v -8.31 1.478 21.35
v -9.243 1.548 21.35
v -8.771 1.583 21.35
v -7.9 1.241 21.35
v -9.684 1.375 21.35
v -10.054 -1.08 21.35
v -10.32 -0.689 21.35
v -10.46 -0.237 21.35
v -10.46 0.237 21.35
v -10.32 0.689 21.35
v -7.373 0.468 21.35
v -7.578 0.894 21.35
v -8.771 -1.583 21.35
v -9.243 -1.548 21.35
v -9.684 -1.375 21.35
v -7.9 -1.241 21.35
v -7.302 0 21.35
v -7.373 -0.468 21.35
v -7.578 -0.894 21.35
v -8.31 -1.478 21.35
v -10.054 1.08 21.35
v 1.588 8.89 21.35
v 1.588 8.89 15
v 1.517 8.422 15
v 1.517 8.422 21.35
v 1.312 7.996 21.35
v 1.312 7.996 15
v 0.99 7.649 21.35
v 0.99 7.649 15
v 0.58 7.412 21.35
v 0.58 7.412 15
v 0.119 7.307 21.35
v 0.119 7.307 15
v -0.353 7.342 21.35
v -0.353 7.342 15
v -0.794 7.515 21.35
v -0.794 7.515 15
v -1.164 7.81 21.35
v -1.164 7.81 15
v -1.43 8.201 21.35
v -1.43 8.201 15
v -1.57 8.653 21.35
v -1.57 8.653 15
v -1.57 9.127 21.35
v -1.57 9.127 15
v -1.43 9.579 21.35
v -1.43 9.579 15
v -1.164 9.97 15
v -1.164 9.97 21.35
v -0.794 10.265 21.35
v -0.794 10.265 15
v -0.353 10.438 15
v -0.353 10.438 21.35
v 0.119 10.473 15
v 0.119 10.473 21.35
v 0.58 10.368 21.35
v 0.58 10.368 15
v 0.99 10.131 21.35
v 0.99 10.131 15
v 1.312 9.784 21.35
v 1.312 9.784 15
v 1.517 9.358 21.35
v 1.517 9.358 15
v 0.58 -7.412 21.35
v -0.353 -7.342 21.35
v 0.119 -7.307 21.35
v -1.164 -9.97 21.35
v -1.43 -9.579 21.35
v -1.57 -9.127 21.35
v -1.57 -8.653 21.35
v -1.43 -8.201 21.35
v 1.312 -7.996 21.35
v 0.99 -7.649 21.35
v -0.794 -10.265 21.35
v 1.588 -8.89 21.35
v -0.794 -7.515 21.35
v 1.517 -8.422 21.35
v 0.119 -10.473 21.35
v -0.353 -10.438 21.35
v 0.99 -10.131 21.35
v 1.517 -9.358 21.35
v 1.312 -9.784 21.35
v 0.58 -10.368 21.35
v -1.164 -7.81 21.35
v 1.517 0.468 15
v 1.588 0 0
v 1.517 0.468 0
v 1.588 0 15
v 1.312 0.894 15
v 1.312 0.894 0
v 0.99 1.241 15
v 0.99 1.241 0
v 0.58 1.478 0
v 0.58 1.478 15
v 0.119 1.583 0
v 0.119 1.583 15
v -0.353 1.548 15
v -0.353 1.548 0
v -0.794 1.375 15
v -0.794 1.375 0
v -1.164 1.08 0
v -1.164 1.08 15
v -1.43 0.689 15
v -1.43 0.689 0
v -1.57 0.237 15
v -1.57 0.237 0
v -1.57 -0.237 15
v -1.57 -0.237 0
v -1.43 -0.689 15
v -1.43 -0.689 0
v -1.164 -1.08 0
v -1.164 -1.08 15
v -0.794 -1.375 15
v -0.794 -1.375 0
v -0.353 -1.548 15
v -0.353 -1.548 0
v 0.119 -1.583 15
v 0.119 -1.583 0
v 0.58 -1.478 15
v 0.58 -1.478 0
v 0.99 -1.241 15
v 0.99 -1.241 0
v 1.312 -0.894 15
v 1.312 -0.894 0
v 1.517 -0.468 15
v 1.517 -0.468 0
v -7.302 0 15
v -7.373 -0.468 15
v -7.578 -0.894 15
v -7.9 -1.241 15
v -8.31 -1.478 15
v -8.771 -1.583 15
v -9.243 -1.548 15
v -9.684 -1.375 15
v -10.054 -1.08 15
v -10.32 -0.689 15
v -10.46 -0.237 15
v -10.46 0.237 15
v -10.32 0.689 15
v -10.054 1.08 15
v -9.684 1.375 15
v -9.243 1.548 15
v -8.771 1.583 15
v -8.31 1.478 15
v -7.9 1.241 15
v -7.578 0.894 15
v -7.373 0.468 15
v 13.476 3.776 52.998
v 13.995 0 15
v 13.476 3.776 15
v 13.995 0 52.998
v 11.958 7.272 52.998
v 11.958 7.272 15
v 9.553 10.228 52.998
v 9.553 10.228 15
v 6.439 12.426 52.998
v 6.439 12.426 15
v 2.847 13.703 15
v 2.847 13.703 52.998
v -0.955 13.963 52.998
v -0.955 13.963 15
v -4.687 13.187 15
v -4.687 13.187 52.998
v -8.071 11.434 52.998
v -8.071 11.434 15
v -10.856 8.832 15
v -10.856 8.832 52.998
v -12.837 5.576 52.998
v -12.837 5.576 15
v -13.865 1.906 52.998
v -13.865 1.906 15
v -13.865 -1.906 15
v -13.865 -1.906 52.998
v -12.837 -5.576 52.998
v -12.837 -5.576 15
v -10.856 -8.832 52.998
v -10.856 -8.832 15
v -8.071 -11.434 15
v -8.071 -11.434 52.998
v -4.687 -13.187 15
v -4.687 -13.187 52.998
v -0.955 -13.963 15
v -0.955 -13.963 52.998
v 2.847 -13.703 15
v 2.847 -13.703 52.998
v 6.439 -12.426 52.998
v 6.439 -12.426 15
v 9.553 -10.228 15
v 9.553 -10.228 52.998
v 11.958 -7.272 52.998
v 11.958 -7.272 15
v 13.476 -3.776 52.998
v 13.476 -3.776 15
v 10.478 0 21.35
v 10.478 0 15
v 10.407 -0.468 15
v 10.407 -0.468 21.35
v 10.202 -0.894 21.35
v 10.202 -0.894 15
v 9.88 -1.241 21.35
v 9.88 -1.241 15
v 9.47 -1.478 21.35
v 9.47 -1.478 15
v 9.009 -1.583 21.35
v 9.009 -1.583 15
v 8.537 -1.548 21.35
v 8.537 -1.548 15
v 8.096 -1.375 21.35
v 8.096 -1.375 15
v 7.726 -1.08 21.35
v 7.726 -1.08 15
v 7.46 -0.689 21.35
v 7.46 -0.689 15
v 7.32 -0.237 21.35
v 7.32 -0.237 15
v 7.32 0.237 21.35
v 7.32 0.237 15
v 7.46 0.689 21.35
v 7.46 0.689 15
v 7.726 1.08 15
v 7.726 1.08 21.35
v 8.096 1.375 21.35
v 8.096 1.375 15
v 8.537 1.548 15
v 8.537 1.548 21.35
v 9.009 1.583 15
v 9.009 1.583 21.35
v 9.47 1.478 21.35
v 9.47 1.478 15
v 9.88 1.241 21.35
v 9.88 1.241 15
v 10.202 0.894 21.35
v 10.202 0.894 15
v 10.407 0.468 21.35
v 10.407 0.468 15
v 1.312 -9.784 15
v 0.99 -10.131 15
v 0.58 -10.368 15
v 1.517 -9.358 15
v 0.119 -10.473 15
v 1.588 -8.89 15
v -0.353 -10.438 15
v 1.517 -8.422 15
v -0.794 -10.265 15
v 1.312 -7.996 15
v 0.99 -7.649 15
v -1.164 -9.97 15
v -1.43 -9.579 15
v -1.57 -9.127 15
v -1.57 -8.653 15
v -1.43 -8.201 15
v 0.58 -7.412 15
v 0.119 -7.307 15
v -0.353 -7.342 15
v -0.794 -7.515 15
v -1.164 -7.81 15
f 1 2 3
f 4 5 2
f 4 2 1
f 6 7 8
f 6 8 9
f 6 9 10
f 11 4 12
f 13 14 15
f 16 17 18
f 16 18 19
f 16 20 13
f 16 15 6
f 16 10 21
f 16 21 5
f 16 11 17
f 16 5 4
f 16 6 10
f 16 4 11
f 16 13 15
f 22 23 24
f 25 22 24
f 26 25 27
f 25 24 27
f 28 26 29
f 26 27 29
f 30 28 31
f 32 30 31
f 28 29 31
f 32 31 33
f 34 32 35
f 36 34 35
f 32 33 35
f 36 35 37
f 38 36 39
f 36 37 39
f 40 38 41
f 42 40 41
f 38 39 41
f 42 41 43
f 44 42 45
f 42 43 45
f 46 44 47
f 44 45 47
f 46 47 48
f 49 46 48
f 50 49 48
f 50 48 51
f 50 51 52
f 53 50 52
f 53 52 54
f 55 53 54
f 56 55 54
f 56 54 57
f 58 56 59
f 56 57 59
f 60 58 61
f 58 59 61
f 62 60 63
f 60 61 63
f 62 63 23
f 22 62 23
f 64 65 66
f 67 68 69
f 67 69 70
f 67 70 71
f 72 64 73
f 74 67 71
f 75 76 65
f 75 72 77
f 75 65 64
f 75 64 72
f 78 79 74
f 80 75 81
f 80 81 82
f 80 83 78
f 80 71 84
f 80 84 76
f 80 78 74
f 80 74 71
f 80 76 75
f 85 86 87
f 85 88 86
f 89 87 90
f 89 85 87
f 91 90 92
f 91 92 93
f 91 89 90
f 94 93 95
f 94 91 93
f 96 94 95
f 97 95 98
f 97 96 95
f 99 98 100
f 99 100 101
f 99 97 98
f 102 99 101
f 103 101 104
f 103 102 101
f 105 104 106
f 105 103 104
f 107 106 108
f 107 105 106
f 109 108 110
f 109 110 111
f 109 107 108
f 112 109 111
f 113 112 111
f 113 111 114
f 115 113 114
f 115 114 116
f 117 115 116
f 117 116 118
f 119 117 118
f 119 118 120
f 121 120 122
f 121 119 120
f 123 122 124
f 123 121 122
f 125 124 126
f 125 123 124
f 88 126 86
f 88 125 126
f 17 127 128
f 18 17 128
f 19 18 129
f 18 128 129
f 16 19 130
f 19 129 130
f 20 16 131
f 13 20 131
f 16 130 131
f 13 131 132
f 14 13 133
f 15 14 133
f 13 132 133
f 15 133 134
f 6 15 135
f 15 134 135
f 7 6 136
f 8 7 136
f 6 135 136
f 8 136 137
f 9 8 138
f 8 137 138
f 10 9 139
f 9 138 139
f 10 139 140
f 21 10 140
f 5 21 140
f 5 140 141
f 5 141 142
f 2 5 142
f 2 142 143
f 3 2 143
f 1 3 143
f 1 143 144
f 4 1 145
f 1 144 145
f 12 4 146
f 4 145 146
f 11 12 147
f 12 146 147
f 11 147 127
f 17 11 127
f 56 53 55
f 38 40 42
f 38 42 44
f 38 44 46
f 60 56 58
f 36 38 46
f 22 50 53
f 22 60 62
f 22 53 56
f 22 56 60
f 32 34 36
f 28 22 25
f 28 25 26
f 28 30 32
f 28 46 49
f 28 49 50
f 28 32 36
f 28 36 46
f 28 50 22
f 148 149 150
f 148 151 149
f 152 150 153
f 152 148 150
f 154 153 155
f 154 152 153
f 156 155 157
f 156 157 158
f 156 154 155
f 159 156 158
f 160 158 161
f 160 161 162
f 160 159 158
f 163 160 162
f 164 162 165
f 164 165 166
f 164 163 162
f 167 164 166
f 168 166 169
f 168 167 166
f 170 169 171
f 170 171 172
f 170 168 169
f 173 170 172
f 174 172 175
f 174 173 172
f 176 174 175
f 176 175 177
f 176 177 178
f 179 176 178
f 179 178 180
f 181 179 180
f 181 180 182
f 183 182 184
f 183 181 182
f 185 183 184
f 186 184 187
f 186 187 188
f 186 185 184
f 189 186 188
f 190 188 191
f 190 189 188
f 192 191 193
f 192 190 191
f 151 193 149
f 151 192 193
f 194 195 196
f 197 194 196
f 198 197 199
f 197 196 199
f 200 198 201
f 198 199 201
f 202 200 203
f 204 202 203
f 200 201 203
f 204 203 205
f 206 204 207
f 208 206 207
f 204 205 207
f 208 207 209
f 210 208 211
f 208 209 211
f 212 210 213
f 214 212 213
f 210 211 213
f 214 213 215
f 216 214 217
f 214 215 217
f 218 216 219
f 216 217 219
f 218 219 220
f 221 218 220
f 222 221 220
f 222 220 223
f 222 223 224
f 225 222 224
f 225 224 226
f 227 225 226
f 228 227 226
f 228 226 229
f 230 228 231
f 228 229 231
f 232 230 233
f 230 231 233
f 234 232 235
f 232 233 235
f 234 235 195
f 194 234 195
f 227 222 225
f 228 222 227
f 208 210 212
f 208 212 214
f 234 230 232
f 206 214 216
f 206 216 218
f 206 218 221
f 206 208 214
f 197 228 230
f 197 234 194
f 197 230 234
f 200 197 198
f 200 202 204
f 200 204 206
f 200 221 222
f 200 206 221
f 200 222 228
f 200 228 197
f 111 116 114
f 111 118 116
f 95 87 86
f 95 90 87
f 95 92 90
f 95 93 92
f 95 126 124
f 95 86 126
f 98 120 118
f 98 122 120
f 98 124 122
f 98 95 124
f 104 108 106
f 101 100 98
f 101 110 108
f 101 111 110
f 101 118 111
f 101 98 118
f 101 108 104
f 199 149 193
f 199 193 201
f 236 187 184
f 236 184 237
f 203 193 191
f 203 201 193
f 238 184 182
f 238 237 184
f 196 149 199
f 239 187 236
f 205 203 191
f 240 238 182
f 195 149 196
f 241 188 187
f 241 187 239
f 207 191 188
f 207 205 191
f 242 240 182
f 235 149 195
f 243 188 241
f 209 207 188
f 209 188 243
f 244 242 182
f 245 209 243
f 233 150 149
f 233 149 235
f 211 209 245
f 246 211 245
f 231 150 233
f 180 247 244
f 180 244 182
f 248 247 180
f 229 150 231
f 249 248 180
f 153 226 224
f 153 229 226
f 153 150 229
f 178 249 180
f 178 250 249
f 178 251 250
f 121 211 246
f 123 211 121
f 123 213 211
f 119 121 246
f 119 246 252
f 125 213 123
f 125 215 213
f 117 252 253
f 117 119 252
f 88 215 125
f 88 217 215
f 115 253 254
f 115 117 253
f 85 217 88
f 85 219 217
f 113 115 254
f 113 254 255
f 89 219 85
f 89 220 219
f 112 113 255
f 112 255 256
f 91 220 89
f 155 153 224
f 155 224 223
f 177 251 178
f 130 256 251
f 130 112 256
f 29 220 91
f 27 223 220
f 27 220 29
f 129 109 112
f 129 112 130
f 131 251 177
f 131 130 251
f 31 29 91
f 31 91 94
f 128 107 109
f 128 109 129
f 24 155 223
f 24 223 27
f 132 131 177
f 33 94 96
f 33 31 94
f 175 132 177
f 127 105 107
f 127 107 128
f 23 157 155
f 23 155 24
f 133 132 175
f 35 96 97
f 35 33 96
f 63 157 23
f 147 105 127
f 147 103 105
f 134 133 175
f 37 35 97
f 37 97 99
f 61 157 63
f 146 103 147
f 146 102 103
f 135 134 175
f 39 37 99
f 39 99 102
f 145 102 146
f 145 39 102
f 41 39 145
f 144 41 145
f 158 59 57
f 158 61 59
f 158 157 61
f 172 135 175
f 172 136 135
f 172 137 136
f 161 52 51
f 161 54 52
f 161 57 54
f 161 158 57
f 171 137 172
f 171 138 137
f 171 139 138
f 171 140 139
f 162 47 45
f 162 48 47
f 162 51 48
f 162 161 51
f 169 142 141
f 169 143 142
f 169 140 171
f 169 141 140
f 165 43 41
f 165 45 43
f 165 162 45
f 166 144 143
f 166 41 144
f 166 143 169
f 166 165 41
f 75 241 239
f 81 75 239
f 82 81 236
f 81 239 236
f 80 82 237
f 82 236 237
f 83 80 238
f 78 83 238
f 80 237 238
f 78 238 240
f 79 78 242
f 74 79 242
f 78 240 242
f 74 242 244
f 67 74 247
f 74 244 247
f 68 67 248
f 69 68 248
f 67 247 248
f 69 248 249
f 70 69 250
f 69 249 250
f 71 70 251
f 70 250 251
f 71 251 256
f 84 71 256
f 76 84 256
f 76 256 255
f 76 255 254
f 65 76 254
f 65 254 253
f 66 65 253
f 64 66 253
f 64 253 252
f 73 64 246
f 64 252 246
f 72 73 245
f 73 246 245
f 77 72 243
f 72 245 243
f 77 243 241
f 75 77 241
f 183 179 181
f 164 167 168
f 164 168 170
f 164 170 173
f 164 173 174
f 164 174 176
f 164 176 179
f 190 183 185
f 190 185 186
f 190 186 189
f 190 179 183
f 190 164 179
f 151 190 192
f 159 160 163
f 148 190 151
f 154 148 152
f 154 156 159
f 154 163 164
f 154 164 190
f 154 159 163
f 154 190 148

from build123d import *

# Parameters (mm, degrees)
F2_R     = 1.5875
F3_DEPTH = 6.35


with BuildPart() as f1:
    # F0 (on Front) → F1 (revolve)
    with BuildSketch(Plane.XZ):
        Polygon((0, 52.9984), (0, 0), (1.5875, 0), (1.5875, 15), (13.9954, 15), (13.9954, 52.9984), align=None)
    revolve(axis=Axis((0, 0, 34.635175), (0, 0, 1)))

    # F2 (on face) → F3 (cut)
    with BuildSketch(Plane(origin=(0, 0, 15), x_dir=(1, 0, 0), z_dir=(0, 0, -1))):
        with Locations((8.89, 0)):
            Circle(F2_R)
        with Locations((0, 8.89)):
            Circle(F2_R)
        with Locations((0, -8.89)):
            Circle(F2_R)
        with Locations((-8.89, 0)):
            Circle(F2_R)
    extrude(amount=-F3_DEPTH, mode=Mode.SUBTRACT)


solid = f1.part
